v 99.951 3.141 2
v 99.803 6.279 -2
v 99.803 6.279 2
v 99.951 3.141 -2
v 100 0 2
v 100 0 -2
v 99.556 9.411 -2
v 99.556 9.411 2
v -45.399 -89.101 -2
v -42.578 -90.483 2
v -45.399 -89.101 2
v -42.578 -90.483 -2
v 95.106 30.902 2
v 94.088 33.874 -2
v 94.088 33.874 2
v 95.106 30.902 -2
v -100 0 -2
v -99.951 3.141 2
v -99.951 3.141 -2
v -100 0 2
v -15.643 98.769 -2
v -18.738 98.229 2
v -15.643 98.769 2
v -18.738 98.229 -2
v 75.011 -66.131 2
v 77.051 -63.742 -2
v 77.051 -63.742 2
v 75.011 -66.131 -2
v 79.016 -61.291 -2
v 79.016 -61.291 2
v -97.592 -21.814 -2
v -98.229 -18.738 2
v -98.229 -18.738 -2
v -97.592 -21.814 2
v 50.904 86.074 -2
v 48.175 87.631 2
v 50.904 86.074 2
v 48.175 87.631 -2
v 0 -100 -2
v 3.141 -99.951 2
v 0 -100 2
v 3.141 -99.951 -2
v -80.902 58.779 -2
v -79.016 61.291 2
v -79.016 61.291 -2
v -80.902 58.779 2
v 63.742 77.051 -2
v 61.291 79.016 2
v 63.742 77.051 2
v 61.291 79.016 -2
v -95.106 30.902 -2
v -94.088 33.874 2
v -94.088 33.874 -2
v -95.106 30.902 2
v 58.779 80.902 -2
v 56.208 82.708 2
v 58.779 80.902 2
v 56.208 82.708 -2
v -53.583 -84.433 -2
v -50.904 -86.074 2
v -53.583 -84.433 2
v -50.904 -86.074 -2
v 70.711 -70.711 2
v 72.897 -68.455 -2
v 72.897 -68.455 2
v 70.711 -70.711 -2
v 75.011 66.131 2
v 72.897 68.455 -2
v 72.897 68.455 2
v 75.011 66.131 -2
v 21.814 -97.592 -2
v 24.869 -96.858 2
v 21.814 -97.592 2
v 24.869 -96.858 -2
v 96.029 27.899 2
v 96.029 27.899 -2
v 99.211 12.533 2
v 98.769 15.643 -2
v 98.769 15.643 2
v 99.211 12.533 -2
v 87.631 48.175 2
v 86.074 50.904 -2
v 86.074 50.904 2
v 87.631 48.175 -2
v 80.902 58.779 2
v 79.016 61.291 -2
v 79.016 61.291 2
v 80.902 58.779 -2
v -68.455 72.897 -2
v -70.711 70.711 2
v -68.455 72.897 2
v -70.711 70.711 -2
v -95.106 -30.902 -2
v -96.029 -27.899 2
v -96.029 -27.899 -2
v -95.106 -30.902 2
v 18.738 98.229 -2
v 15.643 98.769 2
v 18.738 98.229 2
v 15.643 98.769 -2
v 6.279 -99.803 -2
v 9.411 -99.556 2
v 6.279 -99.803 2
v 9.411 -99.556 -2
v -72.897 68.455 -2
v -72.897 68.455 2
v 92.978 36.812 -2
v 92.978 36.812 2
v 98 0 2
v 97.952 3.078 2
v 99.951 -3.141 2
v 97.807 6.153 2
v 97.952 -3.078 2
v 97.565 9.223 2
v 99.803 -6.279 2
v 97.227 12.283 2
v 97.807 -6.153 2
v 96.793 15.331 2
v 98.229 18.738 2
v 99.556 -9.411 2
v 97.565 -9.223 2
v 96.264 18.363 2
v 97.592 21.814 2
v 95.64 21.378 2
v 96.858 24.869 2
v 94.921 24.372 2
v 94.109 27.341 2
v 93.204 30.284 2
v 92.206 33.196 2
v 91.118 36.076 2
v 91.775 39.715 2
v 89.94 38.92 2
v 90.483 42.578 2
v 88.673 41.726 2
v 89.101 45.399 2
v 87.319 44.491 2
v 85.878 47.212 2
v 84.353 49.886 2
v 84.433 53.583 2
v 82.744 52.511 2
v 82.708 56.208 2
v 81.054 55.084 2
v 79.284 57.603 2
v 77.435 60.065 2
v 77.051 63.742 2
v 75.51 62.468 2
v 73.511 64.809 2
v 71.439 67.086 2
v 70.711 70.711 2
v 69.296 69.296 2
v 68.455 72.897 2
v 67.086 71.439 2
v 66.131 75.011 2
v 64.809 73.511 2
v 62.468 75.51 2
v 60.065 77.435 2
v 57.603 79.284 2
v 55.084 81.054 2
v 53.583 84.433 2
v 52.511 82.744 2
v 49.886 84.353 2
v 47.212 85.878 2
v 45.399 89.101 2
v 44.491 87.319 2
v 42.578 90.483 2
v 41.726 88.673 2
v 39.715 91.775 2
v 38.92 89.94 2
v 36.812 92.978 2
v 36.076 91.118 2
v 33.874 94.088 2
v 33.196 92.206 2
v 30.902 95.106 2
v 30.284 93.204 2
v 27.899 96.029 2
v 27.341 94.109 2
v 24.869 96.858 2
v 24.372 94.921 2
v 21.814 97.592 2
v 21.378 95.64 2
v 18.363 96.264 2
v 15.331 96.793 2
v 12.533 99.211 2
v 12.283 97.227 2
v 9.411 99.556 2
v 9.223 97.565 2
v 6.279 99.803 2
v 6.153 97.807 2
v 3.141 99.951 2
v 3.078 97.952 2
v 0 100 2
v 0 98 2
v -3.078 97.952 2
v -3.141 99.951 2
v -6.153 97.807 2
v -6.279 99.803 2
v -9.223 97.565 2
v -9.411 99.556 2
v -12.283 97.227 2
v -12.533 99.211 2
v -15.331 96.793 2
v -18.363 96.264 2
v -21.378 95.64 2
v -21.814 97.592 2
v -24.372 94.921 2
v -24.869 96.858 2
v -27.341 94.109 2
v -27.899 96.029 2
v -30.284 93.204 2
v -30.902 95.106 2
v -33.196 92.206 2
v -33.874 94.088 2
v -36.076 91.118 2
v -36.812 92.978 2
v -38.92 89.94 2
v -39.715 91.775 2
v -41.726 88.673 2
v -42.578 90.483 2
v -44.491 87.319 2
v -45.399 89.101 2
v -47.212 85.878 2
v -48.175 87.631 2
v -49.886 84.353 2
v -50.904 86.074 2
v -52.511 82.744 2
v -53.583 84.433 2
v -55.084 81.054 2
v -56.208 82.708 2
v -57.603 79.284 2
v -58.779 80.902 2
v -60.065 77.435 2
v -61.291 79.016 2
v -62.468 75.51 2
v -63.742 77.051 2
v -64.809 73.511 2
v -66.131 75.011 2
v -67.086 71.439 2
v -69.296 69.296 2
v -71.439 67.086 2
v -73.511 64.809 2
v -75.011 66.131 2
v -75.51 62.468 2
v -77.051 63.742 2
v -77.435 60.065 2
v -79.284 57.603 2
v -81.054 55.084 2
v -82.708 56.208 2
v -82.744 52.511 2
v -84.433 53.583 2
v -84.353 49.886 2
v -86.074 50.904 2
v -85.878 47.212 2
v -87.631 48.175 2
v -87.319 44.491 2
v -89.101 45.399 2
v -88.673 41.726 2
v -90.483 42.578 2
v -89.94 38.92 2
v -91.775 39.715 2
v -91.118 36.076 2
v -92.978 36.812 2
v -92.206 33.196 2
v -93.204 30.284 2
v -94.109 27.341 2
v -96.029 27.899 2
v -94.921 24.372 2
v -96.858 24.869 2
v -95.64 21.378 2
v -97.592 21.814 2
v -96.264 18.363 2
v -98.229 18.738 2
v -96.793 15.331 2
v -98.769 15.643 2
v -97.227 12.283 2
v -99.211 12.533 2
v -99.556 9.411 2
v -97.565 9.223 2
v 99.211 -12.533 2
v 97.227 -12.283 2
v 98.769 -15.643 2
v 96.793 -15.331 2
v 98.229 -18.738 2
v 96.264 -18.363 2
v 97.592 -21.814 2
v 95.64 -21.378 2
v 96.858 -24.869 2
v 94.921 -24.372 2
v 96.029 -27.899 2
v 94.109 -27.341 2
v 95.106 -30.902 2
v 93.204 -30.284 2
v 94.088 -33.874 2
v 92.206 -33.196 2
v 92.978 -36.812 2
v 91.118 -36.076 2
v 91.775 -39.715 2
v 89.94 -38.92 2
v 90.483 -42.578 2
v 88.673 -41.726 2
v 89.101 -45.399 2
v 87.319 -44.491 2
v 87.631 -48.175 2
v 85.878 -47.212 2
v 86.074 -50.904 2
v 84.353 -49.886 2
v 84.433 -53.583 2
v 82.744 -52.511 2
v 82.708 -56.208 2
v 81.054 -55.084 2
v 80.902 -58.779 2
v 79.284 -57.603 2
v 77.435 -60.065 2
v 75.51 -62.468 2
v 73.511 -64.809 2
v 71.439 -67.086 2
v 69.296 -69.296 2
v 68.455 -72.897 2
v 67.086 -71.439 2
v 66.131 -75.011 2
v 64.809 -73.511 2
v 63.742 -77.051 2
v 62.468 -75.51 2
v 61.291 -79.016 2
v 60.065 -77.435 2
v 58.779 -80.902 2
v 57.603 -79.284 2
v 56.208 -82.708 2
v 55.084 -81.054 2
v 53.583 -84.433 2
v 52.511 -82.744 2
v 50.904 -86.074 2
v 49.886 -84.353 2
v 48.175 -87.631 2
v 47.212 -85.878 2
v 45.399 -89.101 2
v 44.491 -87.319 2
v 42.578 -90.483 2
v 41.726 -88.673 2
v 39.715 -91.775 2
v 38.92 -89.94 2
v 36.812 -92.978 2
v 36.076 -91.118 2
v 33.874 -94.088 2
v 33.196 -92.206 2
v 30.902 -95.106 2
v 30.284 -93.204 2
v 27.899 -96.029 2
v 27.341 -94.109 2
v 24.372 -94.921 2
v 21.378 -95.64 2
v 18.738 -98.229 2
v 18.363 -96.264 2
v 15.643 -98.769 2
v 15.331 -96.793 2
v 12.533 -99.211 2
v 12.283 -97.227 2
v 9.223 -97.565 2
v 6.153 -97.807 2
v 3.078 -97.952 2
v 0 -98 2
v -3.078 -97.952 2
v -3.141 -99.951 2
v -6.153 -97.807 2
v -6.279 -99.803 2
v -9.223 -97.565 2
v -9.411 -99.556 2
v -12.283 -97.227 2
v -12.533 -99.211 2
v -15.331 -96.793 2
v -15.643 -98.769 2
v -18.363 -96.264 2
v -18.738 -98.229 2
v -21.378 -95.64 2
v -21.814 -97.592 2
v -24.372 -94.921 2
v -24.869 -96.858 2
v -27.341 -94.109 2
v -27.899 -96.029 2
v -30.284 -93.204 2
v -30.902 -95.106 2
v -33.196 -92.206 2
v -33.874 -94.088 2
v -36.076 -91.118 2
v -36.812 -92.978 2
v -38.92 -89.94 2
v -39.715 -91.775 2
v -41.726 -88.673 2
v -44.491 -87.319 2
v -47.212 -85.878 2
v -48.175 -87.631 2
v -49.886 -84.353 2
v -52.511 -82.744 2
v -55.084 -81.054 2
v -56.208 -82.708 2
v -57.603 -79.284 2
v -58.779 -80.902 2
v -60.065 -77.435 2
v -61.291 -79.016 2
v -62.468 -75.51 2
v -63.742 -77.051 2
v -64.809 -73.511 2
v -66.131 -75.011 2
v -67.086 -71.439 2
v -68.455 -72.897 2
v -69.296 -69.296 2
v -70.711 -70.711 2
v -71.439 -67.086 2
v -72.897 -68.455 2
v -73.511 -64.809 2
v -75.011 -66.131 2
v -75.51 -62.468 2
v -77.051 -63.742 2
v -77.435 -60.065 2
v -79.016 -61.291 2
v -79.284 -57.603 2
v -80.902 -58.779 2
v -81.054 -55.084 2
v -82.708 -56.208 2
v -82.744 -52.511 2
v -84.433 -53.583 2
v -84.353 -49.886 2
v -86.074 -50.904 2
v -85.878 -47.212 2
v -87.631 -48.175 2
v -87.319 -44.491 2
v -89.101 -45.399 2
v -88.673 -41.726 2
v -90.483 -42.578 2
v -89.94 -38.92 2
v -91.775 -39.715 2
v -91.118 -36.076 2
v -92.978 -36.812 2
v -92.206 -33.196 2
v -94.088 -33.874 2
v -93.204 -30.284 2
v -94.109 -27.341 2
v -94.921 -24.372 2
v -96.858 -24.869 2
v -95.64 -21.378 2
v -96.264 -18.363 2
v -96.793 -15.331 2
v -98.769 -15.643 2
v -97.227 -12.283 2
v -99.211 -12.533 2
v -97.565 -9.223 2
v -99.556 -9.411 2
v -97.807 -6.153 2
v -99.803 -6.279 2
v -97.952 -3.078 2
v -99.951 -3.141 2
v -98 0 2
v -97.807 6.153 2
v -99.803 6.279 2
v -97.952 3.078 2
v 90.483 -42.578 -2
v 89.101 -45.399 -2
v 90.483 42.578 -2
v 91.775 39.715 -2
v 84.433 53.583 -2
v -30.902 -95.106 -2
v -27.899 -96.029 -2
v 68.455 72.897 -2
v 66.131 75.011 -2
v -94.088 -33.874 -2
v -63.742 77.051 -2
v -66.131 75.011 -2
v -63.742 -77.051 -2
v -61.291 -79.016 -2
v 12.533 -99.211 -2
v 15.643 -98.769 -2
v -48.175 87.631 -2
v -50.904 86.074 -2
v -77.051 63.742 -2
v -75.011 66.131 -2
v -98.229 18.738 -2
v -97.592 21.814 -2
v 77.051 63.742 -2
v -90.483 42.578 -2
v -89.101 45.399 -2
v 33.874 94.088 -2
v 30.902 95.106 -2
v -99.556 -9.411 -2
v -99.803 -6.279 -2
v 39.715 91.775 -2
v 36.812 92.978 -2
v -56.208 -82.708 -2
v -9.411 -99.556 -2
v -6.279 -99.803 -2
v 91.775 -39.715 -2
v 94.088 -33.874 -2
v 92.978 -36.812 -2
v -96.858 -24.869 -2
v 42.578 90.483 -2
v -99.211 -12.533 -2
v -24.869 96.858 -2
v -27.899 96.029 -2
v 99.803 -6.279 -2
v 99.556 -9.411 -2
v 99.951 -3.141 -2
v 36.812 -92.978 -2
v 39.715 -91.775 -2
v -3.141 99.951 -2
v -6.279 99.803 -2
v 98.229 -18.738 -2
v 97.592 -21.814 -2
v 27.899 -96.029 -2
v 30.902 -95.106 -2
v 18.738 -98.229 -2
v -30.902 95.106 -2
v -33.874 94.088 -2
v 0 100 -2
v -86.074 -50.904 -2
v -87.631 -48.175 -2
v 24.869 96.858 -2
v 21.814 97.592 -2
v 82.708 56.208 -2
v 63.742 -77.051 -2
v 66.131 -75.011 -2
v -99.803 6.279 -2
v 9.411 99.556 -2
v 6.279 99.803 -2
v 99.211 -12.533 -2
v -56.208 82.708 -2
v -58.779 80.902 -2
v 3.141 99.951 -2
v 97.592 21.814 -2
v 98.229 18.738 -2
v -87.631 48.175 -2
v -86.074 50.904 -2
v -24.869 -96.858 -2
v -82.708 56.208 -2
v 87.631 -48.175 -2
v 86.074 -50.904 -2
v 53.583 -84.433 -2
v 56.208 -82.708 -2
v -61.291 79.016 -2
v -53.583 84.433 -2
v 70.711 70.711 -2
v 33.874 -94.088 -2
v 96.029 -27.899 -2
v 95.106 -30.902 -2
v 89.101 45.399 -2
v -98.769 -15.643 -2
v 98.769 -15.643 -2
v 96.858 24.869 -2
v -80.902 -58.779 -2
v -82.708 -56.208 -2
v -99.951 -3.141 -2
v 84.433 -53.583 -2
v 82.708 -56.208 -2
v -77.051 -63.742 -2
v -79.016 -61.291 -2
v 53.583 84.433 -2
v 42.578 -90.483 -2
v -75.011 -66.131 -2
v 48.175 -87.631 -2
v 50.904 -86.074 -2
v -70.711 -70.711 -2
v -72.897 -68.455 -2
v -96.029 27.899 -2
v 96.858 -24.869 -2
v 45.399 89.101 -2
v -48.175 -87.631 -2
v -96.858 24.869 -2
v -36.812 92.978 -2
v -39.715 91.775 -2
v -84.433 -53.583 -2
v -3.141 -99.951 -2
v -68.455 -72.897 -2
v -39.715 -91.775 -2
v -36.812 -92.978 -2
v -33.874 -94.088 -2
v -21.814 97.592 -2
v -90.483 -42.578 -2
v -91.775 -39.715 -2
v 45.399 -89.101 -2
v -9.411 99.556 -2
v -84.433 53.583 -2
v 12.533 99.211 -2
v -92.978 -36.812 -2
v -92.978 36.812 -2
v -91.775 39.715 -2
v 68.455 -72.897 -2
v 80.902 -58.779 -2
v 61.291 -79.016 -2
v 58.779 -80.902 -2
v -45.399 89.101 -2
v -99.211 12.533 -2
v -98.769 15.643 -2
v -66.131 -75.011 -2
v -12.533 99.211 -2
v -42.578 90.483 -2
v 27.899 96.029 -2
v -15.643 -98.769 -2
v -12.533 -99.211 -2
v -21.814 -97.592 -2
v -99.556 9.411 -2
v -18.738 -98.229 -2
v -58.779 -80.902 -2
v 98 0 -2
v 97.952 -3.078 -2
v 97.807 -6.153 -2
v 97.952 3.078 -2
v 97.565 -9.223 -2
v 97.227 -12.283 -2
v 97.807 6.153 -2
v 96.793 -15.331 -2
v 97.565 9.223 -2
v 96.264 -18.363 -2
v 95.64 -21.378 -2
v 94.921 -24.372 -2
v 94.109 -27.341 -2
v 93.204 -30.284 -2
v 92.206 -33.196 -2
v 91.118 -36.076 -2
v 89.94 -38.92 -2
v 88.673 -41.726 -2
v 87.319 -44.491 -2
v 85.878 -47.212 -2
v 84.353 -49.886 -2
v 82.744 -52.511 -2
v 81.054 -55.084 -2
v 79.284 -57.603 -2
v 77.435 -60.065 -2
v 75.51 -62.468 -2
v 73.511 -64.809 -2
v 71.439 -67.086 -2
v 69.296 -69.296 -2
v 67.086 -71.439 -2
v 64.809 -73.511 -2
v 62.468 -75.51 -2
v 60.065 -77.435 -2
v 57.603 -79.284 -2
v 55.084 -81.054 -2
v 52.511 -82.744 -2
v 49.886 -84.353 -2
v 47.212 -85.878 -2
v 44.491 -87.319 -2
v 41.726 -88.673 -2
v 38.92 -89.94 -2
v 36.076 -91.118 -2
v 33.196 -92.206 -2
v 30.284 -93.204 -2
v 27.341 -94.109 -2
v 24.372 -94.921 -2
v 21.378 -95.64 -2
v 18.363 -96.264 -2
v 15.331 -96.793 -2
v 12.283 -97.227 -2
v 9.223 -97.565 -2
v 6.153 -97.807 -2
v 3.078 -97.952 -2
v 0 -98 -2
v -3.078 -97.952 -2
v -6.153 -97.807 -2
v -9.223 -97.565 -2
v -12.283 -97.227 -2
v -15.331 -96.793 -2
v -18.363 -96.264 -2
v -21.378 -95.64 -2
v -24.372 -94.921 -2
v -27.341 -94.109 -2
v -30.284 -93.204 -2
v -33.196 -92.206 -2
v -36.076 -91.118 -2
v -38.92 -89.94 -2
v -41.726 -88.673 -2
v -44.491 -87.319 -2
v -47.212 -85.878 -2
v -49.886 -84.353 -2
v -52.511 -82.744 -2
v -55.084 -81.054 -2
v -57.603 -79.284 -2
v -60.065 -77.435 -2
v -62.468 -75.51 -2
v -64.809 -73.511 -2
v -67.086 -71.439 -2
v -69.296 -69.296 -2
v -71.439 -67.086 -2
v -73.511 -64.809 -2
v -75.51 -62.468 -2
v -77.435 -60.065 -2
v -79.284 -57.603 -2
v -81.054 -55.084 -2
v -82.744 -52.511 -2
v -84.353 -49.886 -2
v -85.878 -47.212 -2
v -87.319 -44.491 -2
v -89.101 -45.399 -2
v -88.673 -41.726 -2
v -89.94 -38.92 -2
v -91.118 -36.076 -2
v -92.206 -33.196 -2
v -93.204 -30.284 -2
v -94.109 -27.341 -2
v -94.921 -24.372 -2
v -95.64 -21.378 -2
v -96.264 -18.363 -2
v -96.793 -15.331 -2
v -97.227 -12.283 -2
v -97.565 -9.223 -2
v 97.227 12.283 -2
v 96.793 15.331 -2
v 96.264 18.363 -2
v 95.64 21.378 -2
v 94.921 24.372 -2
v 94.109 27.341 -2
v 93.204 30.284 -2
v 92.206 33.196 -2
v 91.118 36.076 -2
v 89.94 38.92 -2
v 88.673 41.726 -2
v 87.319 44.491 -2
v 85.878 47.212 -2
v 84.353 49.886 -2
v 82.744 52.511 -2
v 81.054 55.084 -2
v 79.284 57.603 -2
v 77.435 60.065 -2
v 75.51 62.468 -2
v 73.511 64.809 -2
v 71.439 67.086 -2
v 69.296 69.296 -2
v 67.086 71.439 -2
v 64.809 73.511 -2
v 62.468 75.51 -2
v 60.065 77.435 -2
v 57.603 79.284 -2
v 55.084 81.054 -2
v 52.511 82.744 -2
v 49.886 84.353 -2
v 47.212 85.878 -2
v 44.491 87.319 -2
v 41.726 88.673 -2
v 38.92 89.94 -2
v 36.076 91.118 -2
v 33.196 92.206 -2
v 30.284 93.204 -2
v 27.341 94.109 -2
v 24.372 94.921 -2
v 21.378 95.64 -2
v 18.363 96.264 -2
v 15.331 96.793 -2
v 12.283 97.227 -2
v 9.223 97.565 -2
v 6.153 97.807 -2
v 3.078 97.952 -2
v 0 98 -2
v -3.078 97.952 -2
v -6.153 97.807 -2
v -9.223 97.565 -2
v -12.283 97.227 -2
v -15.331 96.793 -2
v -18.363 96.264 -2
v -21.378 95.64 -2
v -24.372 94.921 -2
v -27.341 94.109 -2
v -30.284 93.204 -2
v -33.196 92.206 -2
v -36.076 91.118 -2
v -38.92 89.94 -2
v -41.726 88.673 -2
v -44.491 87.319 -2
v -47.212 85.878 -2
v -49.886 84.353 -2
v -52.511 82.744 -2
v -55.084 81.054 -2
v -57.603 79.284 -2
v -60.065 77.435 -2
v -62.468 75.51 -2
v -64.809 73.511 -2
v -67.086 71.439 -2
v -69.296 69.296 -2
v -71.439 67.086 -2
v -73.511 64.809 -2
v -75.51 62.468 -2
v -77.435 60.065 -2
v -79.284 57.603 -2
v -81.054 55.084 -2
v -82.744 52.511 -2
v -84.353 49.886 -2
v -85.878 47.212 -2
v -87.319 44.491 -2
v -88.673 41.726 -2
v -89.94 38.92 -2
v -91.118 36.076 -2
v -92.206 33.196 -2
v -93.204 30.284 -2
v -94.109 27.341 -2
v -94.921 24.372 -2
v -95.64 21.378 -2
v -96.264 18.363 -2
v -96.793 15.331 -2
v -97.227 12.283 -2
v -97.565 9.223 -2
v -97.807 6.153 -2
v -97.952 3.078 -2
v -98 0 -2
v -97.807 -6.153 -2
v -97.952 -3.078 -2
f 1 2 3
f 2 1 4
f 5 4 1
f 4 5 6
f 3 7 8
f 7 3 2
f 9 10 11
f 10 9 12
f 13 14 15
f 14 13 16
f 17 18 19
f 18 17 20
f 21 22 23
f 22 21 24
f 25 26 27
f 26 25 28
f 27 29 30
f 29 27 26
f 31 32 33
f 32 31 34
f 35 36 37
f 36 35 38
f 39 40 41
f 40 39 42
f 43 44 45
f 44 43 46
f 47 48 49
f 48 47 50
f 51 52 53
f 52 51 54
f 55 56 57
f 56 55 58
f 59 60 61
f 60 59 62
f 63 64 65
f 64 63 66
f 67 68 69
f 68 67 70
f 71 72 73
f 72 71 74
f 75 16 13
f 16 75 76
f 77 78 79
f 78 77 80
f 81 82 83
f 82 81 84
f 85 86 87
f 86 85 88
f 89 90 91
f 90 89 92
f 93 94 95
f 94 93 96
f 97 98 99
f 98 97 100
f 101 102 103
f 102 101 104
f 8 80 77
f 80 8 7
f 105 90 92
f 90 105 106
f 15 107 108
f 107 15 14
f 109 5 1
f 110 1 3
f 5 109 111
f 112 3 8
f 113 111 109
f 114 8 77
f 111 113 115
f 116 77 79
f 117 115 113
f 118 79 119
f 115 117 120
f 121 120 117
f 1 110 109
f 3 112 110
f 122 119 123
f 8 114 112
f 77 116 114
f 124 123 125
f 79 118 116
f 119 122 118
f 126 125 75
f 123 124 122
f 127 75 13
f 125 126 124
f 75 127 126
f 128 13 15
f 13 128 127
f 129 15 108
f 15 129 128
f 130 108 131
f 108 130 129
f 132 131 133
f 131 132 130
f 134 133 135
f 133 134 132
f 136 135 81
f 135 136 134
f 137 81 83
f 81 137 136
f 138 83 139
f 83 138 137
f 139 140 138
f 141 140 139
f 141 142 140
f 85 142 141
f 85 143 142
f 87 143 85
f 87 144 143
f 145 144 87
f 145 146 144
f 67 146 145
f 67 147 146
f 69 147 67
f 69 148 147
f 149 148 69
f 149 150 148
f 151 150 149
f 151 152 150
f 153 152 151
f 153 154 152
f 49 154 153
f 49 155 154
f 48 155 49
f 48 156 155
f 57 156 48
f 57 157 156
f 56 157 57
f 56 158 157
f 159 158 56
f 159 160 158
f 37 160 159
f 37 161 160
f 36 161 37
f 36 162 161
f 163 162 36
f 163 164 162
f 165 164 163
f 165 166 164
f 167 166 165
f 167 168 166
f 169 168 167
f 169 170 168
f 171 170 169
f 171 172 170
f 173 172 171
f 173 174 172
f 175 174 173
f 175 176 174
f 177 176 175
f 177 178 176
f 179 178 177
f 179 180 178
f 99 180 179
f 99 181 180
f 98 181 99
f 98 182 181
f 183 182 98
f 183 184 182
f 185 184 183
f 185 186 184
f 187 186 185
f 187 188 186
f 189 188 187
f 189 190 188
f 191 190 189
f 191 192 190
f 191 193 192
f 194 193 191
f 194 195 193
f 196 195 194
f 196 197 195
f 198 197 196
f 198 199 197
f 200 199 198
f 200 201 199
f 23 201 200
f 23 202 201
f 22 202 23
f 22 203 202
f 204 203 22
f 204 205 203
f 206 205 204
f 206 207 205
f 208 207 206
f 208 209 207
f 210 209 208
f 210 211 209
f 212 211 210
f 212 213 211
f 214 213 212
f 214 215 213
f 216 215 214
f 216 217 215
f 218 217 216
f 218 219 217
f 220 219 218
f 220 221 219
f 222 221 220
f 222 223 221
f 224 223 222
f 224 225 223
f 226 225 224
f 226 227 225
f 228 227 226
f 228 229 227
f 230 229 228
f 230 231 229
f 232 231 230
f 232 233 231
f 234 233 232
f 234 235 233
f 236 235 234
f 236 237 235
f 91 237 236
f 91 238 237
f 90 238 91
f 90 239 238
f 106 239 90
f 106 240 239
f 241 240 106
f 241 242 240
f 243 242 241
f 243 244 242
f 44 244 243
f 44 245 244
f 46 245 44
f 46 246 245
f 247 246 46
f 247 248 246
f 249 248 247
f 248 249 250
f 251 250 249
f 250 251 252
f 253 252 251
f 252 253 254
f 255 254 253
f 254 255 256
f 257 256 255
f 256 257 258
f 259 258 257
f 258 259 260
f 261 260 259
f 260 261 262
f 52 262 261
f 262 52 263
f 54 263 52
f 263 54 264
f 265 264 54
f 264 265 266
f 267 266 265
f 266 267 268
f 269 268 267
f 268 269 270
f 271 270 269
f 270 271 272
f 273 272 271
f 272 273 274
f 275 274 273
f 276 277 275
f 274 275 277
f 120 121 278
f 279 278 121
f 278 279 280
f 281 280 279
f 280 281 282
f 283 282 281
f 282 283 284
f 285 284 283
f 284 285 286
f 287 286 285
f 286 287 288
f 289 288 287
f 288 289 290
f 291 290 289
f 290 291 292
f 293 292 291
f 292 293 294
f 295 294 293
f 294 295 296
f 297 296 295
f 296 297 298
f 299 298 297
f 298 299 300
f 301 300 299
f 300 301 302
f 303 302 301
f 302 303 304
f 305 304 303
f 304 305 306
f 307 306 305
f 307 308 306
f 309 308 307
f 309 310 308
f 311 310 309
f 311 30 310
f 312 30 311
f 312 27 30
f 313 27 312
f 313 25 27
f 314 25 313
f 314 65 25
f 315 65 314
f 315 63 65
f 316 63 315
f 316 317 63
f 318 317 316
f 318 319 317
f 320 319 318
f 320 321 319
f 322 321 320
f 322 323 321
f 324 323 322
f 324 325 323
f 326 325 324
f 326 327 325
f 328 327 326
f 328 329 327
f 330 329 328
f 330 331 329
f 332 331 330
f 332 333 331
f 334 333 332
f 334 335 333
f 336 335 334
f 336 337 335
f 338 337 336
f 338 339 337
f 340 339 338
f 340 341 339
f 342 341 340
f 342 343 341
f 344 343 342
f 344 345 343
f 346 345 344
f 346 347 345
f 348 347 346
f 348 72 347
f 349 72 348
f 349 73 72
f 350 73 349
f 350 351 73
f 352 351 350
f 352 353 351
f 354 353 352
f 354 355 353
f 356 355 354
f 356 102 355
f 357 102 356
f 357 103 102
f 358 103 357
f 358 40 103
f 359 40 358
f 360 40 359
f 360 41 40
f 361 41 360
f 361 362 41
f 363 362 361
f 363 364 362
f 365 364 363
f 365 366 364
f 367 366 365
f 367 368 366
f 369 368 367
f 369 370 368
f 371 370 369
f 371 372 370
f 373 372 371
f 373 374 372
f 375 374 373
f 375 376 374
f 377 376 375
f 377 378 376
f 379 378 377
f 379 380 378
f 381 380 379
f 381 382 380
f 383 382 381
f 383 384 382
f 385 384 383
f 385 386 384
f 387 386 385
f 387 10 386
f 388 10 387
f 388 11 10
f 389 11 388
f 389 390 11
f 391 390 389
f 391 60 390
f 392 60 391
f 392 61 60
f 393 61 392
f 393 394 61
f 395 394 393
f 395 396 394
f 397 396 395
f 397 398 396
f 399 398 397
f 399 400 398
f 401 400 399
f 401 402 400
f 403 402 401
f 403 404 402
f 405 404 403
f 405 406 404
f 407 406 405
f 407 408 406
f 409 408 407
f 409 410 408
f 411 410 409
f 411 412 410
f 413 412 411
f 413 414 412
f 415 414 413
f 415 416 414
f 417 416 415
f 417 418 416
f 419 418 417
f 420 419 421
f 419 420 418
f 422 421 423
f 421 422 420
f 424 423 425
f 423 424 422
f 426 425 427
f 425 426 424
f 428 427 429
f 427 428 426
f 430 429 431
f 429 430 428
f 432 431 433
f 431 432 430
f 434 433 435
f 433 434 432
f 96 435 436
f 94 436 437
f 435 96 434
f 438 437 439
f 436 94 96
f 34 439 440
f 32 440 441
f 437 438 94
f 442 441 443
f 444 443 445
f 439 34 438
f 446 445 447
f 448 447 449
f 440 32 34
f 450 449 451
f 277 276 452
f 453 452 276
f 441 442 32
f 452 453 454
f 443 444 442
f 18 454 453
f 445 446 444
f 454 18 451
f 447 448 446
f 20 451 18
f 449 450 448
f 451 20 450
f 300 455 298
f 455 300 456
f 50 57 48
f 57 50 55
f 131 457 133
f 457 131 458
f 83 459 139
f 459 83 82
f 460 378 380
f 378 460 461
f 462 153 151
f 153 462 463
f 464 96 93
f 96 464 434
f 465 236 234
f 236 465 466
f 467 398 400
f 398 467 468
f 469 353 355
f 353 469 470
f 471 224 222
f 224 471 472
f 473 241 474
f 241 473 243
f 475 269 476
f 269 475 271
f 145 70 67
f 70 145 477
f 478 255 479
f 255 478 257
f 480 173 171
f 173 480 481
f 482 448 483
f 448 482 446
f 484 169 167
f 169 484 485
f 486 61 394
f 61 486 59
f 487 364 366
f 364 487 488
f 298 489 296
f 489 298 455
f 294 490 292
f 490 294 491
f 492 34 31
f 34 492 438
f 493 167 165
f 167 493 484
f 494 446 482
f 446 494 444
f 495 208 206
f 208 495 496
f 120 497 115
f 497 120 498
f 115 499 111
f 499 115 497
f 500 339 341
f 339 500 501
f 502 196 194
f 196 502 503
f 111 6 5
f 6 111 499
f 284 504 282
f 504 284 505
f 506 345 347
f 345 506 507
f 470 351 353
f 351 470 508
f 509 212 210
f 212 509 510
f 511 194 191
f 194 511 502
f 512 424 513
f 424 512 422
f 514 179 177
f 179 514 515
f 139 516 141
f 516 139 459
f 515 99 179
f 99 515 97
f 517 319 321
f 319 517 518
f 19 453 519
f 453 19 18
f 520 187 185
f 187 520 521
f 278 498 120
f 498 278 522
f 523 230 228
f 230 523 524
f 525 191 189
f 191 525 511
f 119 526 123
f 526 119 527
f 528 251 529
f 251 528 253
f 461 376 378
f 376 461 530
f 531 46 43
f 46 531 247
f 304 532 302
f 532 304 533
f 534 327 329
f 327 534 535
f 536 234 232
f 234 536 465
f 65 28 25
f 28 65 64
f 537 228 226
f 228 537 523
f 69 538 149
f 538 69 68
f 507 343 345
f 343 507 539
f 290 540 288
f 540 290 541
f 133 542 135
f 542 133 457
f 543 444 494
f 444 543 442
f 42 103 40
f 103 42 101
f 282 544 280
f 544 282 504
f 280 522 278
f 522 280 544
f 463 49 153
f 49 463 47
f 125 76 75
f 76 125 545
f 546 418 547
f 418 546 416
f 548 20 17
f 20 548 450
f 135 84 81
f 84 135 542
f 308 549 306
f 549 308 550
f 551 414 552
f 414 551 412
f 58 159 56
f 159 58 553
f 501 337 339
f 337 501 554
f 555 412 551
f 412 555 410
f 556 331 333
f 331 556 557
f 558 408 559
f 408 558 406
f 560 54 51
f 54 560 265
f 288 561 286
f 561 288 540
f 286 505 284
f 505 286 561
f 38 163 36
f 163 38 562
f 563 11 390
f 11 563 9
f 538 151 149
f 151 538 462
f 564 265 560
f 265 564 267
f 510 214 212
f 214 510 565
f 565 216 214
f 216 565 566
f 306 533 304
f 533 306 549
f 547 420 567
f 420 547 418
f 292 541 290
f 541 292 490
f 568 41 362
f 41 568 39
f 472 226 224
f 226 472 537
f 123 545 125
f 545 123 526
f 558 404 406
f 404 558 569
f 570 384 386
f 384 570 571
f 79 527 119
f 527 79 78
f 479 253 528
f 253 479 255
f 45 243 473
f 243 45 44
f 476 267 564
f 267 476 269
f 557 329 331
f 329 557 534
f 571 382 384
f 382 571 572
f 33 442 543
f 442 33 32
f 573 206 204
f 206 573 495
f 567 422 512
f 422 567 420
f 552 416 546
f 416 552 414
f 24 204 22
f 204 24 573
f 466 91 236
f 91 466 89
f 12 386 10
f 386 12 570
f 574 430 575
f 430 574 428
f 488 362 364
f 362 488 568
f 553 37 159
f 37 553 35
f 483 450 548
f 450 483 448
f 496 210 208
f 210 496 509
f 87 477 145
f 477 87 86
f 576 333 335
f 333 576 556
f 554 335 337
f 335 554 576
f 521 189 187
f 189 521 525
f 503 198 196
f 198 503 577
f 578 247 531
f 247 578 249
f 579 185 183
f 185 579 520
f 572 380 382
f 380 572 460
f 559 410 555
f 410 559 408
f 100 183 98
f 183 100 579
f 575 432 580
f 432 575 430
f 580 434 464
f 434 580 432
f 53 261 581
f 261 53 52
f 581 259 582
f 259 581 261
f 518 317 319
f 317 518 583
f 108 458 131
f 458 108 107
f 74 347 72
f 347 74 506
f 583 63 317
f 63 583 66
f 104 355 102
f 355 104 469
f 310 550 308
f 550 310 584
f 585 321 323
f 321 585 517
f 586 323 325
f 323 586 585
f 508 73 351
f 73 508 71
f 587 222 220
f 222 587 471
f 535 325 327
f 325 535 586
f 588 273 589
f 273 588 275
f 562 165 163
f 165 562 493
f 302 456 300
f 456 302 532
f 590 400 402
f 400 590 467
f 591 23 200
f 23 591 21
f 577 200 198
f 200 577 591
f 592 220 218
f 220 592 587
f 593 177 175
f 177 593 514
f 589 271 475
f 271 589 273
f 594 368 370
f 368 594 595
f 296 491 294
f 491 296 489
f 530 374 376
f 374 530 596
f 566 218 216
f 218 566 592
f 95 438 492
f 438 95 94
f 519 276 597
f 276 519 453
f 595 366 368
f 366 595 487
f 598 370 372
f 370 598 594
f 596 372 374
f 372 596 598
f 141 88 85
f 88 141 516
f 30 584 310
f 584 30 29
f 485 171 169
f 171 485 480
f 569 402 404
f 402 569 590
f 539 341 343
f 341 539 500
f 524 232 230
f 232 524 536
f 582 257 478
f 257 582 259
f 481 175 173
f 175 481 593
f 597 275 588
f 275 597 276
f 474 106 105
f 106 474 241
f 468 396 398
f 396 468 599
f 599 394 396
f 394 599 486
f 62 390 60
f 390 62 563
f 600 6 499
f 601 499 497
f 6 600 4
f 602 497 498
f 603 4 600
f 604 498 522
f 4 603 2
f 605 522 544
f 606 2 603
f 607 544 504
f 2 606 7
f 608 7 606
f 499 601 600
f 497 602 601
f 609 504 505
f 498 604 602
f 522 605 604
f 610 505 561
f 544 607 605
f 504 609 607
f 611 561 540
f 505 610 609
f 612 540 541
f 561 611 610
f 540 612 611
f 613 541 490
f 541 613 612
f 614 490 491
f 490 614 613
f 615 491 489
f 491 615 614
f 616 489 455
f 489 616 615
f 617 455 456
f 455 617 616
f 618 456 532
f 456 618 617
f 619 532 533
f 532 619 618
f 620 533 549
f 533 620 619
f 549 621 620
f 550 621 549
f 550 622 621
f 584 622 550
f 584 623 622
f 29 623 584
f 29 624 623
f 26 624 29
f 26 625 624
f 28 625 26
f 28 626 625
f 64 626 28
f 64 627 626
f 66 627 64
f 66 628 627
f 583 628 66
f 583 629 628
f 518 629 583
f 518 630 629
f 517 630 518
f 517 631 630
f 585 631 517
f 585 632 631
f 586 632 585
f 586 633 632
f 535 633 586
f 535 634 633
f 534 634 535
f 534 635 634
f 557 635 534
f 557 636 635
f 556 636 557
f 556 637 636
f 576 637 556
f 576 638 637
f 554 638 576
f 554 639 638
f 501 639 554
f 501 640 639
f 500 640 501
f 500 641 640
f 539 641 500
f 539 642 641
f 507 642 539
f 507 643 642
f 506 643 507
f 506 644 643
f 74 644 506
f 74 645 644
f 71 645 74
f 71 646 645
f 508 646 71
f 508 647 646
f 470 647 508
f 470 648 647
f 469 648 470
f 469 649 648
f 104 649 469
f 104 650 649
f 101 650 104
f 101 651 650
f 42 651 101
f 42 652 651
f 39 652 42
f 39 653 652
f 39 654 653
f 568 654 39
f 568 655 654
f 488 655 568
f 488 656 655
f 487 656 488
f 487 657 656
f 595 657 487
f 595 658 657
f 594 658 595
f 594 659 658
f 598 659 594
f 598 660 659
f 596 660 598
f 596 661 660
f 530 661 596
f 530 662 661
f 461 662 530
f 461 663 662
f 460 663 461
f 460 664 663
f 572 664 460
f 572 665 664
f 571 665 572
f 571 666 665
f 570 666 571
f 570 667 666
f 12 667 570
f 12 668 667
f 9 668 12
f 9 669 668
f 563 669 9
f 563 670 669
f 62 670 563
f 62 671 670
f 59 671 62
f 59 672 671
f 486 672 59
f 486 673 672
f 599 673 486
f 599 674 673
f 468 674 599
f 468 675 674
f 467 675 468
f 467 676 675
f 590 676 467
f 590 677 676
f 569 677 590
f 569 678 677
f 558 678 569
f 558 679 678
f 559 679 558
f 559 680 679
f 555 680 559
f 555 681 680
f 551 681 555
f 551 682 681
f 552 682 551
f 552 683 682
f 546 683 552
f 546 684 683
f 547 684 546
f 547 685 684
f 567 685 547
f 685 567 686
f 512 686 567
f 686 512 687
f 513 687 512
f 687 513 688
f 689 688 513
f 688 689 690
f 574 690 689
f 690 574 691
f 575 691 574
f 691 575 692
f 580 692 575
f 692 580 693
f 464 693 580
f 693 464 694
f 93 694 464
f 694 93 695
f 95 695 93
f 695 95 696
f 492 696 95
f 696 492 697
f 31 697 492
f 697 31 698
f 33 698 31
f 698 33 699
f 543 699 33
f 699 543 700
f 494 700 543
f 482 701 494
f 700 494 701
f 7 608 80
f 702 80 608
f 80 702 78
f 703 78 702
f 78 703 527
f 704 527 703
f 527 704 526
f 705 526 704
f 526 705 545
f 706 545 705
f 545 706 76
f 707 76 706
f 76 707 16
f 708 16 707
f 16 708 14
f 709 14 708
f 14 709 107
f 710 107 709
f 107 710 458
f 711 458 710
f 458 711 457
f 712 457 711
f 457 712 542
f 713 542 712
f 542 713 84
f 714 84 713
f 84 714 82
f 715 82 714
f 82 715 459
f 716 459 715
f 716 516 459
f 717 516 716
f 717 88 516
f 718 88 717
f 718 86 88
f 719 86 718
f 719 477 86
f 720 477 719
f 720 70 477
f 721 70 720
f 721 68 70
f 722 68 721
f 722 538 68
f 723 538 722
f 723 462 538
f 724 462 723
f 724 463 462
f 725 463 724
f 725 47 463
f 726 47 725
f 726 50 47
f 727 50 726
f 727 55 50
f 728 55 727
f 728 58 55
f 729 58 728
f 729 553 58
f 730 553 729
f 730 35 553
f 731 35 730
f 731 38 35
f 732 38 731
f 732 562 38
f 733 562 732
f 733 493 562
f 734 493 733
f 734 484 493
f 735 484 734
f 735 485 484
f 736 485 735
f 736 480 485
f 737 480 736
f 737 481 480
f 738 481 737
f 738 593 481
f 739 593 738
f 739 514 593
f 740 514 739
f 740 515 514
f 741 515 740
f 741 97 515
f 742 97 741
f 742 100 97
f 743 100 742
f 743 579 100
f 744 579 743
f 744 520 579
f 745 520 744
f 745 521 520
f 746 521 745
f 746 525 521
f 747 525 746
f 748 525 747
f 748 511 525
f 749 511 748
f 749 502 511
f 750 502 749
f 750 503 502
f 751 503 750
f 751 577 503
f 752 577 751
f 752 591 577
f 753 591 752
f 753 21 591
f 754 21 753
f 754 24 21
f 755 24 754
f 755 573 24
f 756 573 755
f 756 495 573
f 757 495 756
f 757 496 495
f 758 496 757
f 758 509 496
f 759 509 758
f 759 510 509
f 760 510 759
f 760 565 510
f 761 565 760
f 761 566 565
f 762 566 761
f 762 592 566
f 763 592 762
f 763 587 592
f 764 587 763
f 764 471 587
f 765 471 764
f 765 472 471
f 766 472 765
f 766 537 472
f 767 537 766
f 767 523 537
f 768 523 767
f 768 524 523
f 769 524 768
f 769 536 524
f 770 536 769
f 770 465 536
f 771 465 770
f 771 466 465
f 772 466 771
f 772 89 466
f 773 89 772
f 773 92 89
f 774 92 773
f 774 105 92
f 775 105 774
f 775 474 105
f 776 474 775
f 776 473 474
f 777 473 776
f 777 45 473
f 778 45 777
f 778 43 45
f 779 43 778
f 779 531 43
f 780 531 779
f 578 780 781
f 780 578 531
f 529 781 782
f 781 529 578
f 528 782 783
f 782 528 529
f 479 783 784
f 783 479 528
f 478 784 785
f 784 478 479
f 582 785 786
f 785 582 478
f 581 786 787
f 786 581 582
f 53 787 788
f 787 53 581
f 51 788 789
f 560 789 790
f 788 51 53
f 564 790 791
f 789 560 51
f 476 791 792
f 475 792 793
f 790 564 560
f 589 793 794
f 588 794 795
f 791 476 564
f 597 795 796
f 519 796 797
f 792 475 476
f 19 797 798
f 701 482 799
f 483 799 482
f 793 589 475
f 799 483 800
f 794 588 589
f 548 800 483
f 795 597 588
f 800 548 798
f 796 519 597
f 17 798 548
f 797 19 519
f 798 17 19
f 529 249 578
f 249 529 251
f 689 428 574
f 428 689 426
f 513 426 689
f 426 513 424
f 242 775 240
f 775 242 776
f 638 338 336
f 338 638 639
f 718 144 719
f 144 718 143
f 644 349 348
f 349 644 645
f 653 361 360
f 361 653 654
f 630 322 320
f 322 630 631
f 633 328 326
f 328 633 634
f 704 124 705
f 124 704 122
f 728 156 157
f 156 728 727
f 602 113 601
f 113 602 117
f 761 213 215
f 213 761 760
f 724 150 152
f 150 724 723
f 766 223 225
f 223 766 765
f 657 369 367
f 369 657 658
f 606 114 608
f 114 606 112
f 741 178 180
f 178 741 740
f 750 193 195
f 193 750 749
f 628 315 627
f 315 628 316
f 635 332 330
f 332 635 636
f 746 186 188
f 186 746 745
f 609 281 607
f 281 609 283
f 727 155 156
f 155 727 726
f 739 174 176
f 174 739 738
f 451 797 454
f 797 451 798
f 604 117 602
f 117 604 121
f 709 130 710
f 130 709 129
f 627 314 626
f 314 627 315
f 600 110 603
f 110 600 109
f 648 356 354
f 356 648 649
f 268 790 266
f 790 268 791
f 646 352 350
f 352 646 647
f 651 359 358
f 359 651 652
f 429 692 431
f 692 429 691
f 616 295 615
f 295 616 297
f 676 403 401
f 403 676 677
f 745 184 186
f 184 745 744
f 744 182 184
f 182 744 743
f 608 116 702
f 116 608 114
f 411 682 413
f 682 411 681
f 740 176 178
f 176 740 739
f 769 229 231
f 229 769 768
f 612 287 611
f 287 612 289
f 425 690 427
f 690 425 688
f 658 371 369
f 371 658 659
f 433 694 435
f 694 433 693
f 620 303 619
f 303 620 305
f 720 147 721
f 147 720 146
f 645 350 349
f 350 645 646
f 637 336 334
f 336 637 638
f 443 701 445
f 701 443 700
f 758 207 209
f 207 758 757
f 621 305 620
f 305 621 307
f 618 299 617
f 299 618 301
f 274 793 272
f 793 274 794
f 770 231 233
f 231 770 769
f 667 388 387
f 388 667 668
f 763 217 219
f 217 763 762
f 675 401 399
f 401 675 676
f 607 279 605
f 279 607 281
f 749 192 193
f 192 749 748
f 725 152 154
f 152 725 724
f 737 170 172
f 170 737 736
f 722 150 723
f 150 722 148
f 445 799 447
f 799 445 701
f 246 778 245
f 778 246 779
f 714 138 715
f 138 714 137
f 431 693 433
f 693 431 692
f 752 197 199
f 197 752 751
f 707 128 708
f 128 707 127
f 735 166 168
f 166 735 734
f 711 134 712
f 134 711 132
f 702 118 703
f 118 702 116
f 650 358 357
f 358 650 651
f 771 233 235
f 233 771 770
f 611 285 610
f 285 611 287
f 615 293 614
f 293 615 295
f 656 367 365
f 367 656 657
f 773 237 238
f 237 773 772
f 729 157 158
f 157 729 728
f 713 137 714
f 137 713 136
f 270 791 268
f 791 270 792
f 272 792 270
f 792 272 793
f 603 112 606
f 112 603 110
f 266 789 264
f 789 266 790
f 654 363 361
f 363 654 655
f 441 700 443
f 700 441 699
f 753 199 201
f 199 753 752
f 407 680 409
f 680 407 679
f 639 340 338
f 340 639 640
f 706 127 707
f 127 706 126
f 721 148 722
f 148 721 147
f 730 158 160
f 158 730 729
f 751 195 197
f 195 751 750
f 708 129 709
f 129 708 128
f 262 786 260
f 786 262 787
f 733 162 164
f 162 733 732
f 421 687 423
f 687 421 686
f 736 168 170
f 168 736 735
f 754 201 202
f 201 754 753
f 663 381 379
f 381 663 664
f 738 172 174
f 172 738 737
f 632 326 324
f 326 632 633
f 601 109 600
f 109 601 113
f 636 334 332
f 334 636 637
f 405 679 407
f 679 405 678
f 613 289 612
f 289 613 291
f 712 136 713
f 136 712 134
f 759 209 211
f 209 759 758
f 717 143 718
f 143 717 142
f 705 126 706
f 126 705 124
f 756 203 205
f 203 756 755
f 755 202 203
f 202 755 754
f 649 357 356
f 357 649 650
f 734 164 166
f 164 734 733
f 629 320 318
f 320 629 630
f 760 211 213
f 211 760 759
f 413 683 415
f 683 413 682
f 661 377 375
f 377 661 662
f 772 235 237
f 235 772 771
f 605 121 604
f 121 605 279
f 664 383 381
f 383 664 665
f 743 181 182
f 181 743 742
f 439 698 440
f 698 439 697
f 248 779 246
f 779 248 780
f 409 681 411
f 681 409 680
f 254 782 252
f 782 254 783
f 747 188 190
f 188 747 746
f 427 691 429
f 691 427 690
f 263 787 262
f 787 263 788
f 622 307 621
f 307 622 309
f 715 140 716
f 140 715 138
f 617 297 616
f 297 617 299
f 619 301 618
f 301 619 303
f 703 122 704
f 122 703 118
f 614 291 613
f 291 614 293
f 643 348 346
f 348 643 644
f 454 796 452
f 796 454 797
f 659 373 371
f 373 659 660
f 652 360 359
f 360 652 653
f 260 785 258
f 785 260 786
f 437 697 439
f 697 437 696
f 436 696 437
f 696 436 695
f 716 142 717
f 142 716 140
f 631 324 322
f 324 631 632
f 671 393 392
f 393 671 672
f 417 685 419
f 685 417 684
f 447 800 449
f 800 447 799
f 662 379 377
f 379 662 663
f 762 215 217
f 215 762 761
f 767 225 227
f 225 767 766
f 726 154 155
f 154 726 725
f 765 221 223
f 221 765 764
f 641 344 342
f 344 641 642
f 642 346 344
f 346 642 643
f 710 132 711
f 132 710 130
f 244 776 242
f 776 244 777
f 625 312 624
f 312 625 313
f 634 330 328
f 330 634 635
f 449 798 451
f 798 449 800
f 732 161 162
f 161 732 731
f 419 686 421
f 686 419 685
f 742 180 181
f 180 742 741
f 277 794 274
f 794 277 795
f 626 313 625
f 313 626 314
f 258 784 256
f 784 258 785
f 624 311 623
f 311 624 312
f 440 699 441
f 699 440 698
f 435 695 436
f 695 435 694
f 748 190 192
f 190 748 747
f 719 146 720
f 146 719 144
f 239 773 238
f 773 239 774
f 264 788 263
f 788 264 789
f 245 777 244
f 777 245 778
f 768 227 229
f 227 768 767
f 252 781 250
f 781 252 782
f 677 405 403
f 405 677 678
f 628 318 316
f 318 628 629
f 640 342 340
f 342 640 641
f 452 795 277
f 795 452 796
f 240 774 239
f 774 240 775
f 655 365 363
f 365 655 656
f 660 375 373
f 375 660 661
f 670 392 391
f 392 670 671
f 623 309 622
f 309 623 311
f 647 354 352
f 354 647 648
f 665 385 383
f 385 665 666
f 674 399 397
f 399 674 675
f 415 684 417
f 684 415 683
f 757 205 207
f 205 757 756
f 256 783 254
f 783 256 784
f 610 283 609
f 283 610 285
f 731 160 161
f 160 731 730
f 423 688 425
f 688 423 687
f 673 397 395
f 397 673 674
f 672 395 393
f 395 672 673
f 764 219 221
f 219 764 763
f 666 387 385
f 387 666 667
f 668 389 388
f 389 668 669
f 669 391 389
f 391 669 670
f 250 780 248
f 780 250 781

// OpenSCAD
$fn=200;

difference() { 
    cylinder(r=100, h=4, center=true); 
    cylinder(r=98, h=5, center=true); 
}
